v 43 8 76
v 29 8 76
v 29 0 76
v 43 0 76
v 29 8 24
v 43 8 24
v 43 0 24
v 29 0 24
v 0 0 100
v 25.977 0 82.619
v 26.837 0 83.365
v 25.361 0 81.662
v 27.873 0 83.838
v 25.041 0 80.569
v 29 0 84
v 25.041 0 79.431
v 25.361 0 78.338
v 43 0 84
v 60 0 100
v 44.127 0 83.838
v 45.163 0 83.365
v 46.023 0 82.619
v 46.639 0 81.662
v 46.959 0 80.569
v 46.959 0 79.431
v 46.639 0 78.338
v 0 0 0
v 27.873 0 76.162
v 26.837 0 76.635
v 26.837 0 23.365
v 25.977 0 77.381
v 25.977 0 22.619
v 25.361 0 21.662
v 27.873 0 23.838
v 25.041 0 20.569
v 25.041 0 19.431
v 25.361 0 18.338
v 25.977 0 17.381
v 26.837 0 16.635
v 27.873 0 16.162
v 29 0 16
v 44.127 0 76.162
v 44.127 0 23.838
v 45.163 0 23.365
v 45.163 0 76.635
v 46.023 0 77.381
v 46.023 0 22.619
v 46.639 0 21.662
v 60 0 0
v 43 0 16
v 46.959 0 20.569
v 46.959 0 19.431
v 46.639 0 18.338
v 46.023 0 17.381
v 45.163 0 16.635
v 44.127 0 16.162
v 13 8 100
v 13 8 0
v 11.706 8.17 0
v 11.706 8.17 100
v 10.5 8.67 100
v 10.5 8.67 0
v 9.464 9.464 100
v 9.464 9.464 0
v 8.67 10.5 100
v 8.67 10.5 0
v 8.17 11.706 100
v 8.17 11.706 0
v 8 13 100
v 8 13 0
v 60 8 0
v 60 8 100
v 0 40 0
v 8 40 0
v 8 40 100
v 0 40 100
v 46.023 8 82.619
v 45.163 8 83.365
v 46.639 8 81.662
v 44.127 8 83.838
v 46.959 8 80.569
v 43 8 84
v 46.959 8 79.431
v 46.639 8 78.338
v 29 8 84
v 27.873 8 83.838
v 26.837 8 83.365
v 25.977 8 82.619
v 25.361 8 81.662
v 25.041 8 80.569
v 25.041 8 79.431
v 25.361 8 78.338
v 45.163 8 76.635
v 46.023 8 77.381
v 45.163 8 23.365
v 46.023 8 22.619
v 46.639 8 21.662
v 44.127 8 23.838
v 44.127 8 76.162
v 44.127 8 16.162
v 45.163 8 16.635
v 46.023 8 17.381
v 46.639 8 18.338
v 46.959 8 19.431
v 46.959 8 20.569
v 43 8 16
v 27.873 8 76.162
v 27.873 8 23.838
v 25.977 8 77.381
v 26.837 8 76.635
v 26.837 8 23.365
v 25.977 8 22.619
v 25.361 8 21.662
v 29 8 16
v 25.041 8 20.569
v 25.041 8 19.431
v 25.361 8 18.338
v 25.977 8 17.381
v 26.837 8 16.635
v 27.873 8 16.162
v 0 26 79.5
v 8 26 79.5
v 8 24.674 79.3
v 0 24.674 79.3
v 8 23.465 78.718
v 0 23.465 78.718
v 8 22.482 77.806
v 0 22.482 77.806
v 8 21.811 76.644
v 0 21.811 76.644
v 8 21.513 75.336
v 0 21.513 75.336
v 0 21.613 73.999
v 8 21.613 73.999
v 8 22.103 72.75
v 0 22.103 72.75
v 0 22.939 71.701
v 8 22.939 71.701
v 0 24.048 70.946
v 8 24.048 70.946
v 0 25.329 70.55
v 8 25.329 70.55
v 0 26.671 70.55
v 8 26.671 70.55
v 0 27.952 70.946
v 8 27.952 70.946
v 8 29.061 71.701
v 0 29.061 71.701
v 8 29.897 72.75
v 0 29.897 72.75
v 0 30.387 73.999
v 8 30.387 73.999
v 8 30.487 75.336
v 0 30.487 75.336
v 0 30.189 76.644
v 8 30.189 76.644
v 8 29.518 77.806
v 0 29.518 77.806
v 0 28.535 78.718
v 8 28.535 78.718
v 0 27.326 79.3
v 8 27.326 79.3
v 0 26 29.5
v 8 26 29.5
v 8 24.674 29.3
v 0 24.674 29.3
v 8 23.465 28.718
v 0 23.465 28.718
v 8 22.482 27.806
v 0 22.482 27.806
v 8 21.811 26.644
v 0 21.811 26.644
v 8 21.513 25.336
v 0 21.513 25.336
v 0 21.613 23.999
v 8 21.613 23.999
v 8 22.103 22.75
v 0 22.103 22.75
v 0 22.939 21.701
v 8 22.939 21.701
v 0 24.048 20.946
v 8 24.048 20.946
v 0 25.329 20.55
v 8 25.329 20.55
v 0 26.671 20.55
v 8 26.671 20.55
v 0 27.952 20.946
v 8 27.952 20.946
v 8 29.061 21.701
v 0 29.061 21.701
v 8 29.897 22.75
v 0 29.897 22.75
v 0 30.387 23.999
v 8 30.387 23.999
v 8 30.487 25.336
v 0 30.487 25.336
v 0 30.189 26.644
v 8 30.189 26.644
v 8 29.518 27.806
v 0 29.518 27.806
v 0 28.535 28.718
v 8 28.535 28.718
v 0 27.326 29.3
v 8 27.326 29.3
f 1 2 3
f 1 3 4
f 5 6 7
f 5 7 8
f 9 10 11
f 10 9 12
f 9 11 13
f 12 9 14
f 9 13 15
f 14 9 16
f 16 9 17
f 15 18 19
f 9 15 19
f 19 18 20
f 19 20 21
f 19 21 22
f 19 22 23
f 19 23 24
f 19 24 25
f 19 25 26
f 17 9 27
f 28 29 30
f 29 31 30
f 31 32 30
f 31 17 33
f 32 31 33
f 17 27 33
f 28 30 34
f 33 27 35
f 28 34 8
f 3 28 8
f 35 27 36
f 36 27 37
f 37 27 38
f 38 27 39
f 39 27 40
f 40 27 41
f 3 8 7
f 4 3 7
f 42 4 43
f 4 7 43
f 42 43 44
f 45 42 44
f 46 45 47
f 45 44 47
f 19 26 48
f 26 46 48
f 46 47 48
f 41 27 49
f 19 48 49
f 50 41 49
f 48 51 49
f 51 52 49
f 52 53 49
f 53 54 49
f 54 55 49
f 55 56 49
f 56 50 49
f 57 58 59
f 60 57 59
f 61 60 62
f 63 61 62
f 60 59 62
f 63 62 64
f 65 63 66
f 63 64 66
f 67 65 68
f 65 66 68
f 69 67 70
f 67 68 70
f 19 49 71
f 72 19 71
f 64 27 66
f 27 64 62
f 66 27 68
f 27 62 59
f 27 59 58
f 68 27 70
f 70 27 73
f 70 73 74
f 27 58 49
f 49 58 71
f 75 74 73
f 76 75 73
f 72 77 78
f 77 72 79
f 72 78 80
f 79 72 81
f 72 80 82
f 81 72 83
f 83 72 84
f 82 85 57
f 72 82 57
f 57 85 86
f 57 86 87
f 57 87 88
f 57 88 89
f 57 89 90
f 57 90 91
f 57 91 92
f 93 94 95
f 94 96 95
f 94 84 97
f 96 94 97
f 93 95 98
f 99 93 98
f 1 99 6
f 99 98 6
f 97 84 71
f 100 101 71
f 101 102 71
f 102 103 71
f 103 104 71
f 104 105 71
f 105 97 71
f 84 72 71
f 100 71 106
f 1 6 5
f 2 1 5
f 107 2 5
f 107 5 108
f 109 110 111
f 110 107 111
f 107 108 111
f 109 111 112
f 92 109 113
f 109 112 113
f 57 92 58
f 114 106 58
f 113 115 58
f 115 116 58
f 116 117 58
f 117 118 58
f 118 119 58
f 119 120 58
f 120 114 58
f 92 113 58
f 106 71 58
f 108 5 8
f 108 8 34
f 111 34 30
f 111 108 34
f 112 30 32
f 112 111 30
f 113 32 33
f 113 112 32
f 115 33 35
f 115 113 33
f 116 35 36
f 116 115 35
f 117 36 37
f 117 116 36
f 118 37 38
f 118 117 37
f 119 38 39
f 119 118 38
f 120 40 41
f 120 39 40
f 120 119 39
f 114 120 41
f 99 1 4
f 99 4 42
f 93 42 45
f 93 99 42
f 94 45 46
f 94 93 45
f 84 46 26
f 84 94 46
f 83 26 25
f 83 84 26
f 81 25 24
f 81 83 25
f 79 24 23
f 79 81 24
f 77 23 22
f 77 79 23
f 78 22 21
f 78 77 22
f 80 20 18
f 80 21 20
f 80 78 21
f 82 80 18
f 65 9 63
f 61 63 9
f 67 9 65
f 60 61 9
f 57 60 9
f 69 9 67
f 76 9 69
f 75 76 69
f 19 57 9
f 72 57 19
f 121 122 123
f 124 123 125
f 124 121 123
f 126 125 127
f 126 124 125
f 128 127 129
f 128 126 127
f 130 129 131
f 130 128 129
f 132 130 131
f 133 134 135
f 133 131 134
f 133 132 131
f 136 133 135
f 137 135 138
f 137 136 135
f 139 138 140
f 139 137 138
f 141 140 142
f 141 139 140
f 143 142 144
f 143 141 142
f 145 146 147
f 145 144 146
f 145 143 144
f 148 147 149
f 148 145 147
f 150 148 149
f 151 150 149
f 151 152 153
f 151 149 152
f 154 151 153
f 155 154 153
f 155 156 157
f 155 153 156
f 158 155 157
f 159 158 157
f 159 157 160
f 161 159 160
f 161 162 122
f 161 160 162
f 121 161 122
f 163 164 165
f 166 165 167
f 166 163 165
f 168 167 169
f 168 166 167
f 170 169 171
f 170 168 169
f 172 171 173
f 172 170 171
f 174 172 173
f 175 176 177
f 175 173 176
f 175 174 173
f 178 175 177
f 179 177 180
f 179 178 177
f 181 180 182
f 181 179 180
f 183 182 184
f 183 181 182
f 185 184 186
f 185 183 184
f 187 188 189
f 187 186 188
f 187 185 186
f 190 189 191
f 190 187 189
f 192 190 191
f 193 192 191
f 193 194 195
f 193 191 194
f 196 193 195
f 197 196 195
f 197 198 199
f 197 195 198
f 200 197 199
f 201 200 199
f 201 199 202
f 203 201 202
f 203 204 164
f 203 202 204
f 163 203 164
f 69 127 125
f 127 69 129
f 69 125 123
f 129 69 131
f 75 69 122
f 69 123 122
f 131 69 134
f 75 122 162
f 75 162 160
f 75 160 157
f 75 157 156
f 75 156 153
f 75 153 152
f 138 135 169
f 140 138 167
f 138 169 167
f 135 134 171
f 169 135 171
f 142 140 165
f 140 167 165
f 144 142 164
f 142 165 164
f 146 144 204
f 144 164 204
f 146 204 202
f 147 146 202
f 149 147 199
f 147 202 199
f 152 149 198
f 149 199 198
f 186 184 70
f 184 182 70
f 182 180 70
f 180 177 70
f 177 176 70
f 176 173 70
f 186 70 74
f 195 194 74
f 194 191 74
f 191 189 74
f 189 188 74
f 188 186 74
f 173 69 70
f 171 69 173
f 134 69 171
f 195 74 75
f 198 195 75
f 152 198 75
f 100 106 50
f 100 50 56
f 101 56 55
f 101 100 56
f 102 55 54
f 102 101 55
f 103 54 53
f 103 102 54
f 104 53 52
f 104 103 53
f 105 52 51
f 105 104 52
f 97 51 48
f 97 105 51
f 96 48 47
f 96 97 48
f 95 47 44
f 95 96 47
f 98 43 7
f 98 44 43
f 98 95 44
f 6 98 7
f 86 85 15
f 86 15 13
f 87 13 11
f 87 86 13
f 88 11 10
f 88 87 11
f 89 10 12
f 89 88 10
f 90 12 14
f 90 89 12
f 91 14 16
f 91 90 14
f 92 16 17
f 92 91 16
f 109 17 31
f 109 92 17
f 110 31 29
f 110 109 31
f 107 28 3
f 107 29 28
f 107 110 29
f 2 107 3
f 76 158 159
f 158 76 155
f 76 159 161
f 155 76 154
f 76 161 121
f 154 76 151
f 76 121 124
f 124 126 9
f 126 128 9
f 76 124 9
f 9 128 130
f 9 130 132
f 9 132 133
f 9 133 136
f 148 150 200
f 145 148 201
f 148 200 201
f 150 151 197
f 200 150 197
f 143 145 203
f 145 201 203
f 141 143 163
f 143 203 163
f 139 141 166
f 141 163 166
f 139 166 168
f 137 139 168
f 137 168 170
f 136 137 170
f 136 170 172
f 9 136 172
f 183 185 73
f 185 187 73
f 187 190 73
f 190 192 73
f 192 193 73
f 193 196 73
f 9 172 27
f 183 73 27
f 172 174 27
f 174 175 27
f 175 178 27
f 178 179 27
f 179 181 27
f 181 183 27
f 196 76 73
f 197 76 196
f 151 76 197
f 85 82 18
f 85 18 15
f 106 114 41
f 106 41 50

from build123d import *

# Parameters (mm, degrees)
EXTRUDE_1_DEPTH     = 100
CUT_EXTRUDE_3_DEPTH = 121.929731663
SKETCH_4_R          = 4.5
CUT_EXTRUDE_4_DEPTH = 124.288280059


with BuildPart() as part:
    # 草图1 → 凸台-拉伸1 (new body)
    with BuildSketch(Plane.XY):
        with BuildLine():
            Line((0, 0), (60, 0))
            Line((60, 0), (60, 8))
            Line((60, 8), (13, 8))
            ThreePointArc((13, 8), (9.4645, 9.4645), (8, 13))
            Line((8, 13), (8, 40))
            Line((8, 40), (0, 40))
            Line((0, 40), (0, 0))
        make_face()
    extrude(amount=EXTRUDE_1_DEPTH)

    # 草图3 → 切除-拉伸3 (cut, through all)
    with BuildSketch(Plane(origin=(0, 8, 0), x_dir=(1, 0, 0), z_dir=(0, 1, 0))):
        with BuildLine():
            Line((29, -16), (43, -16))
            ThreePointArc((43, -16), (47, -20), (43, -24))
            Line((43, -24), (29, -24))
            ThreePointArc((29, -24), (25, -20), (29, -16))
        make_face()
        with BuildLine():
            Line((29, -76), (43, -76))
            ThreePointArc((43, -76), (47, -80), (43, -84))
            Line((43, -84), (29, -84))
            ThreePointArc((29, -84), (25, -80), (29, -76))
        make_face()
    extrude(amount=-CUT_EXTRUDE_3_DEPTH, mode=Mode.SUBTRACT)

    # 草图4 → 切除-拉伸4 (cut, through all)
    with BuildSketch(Plane(origin=(0, 0, 0), x_dir=(0, 0, -1), z_dir=(1, 0, 0))):
        with Locations(Location((-25, 26, 0), (0, 0, 180))):
            Circle(SKETCH_4_R)
        with Locations(Location((-75, 26, 0), (0, 0, 180))):
            Circle(SKETCH_4_R)
    extrude(amount=CUT_EXTRUDE_4_DEPTH, mode=Mode.SUBTRACT)


solid = part.part
